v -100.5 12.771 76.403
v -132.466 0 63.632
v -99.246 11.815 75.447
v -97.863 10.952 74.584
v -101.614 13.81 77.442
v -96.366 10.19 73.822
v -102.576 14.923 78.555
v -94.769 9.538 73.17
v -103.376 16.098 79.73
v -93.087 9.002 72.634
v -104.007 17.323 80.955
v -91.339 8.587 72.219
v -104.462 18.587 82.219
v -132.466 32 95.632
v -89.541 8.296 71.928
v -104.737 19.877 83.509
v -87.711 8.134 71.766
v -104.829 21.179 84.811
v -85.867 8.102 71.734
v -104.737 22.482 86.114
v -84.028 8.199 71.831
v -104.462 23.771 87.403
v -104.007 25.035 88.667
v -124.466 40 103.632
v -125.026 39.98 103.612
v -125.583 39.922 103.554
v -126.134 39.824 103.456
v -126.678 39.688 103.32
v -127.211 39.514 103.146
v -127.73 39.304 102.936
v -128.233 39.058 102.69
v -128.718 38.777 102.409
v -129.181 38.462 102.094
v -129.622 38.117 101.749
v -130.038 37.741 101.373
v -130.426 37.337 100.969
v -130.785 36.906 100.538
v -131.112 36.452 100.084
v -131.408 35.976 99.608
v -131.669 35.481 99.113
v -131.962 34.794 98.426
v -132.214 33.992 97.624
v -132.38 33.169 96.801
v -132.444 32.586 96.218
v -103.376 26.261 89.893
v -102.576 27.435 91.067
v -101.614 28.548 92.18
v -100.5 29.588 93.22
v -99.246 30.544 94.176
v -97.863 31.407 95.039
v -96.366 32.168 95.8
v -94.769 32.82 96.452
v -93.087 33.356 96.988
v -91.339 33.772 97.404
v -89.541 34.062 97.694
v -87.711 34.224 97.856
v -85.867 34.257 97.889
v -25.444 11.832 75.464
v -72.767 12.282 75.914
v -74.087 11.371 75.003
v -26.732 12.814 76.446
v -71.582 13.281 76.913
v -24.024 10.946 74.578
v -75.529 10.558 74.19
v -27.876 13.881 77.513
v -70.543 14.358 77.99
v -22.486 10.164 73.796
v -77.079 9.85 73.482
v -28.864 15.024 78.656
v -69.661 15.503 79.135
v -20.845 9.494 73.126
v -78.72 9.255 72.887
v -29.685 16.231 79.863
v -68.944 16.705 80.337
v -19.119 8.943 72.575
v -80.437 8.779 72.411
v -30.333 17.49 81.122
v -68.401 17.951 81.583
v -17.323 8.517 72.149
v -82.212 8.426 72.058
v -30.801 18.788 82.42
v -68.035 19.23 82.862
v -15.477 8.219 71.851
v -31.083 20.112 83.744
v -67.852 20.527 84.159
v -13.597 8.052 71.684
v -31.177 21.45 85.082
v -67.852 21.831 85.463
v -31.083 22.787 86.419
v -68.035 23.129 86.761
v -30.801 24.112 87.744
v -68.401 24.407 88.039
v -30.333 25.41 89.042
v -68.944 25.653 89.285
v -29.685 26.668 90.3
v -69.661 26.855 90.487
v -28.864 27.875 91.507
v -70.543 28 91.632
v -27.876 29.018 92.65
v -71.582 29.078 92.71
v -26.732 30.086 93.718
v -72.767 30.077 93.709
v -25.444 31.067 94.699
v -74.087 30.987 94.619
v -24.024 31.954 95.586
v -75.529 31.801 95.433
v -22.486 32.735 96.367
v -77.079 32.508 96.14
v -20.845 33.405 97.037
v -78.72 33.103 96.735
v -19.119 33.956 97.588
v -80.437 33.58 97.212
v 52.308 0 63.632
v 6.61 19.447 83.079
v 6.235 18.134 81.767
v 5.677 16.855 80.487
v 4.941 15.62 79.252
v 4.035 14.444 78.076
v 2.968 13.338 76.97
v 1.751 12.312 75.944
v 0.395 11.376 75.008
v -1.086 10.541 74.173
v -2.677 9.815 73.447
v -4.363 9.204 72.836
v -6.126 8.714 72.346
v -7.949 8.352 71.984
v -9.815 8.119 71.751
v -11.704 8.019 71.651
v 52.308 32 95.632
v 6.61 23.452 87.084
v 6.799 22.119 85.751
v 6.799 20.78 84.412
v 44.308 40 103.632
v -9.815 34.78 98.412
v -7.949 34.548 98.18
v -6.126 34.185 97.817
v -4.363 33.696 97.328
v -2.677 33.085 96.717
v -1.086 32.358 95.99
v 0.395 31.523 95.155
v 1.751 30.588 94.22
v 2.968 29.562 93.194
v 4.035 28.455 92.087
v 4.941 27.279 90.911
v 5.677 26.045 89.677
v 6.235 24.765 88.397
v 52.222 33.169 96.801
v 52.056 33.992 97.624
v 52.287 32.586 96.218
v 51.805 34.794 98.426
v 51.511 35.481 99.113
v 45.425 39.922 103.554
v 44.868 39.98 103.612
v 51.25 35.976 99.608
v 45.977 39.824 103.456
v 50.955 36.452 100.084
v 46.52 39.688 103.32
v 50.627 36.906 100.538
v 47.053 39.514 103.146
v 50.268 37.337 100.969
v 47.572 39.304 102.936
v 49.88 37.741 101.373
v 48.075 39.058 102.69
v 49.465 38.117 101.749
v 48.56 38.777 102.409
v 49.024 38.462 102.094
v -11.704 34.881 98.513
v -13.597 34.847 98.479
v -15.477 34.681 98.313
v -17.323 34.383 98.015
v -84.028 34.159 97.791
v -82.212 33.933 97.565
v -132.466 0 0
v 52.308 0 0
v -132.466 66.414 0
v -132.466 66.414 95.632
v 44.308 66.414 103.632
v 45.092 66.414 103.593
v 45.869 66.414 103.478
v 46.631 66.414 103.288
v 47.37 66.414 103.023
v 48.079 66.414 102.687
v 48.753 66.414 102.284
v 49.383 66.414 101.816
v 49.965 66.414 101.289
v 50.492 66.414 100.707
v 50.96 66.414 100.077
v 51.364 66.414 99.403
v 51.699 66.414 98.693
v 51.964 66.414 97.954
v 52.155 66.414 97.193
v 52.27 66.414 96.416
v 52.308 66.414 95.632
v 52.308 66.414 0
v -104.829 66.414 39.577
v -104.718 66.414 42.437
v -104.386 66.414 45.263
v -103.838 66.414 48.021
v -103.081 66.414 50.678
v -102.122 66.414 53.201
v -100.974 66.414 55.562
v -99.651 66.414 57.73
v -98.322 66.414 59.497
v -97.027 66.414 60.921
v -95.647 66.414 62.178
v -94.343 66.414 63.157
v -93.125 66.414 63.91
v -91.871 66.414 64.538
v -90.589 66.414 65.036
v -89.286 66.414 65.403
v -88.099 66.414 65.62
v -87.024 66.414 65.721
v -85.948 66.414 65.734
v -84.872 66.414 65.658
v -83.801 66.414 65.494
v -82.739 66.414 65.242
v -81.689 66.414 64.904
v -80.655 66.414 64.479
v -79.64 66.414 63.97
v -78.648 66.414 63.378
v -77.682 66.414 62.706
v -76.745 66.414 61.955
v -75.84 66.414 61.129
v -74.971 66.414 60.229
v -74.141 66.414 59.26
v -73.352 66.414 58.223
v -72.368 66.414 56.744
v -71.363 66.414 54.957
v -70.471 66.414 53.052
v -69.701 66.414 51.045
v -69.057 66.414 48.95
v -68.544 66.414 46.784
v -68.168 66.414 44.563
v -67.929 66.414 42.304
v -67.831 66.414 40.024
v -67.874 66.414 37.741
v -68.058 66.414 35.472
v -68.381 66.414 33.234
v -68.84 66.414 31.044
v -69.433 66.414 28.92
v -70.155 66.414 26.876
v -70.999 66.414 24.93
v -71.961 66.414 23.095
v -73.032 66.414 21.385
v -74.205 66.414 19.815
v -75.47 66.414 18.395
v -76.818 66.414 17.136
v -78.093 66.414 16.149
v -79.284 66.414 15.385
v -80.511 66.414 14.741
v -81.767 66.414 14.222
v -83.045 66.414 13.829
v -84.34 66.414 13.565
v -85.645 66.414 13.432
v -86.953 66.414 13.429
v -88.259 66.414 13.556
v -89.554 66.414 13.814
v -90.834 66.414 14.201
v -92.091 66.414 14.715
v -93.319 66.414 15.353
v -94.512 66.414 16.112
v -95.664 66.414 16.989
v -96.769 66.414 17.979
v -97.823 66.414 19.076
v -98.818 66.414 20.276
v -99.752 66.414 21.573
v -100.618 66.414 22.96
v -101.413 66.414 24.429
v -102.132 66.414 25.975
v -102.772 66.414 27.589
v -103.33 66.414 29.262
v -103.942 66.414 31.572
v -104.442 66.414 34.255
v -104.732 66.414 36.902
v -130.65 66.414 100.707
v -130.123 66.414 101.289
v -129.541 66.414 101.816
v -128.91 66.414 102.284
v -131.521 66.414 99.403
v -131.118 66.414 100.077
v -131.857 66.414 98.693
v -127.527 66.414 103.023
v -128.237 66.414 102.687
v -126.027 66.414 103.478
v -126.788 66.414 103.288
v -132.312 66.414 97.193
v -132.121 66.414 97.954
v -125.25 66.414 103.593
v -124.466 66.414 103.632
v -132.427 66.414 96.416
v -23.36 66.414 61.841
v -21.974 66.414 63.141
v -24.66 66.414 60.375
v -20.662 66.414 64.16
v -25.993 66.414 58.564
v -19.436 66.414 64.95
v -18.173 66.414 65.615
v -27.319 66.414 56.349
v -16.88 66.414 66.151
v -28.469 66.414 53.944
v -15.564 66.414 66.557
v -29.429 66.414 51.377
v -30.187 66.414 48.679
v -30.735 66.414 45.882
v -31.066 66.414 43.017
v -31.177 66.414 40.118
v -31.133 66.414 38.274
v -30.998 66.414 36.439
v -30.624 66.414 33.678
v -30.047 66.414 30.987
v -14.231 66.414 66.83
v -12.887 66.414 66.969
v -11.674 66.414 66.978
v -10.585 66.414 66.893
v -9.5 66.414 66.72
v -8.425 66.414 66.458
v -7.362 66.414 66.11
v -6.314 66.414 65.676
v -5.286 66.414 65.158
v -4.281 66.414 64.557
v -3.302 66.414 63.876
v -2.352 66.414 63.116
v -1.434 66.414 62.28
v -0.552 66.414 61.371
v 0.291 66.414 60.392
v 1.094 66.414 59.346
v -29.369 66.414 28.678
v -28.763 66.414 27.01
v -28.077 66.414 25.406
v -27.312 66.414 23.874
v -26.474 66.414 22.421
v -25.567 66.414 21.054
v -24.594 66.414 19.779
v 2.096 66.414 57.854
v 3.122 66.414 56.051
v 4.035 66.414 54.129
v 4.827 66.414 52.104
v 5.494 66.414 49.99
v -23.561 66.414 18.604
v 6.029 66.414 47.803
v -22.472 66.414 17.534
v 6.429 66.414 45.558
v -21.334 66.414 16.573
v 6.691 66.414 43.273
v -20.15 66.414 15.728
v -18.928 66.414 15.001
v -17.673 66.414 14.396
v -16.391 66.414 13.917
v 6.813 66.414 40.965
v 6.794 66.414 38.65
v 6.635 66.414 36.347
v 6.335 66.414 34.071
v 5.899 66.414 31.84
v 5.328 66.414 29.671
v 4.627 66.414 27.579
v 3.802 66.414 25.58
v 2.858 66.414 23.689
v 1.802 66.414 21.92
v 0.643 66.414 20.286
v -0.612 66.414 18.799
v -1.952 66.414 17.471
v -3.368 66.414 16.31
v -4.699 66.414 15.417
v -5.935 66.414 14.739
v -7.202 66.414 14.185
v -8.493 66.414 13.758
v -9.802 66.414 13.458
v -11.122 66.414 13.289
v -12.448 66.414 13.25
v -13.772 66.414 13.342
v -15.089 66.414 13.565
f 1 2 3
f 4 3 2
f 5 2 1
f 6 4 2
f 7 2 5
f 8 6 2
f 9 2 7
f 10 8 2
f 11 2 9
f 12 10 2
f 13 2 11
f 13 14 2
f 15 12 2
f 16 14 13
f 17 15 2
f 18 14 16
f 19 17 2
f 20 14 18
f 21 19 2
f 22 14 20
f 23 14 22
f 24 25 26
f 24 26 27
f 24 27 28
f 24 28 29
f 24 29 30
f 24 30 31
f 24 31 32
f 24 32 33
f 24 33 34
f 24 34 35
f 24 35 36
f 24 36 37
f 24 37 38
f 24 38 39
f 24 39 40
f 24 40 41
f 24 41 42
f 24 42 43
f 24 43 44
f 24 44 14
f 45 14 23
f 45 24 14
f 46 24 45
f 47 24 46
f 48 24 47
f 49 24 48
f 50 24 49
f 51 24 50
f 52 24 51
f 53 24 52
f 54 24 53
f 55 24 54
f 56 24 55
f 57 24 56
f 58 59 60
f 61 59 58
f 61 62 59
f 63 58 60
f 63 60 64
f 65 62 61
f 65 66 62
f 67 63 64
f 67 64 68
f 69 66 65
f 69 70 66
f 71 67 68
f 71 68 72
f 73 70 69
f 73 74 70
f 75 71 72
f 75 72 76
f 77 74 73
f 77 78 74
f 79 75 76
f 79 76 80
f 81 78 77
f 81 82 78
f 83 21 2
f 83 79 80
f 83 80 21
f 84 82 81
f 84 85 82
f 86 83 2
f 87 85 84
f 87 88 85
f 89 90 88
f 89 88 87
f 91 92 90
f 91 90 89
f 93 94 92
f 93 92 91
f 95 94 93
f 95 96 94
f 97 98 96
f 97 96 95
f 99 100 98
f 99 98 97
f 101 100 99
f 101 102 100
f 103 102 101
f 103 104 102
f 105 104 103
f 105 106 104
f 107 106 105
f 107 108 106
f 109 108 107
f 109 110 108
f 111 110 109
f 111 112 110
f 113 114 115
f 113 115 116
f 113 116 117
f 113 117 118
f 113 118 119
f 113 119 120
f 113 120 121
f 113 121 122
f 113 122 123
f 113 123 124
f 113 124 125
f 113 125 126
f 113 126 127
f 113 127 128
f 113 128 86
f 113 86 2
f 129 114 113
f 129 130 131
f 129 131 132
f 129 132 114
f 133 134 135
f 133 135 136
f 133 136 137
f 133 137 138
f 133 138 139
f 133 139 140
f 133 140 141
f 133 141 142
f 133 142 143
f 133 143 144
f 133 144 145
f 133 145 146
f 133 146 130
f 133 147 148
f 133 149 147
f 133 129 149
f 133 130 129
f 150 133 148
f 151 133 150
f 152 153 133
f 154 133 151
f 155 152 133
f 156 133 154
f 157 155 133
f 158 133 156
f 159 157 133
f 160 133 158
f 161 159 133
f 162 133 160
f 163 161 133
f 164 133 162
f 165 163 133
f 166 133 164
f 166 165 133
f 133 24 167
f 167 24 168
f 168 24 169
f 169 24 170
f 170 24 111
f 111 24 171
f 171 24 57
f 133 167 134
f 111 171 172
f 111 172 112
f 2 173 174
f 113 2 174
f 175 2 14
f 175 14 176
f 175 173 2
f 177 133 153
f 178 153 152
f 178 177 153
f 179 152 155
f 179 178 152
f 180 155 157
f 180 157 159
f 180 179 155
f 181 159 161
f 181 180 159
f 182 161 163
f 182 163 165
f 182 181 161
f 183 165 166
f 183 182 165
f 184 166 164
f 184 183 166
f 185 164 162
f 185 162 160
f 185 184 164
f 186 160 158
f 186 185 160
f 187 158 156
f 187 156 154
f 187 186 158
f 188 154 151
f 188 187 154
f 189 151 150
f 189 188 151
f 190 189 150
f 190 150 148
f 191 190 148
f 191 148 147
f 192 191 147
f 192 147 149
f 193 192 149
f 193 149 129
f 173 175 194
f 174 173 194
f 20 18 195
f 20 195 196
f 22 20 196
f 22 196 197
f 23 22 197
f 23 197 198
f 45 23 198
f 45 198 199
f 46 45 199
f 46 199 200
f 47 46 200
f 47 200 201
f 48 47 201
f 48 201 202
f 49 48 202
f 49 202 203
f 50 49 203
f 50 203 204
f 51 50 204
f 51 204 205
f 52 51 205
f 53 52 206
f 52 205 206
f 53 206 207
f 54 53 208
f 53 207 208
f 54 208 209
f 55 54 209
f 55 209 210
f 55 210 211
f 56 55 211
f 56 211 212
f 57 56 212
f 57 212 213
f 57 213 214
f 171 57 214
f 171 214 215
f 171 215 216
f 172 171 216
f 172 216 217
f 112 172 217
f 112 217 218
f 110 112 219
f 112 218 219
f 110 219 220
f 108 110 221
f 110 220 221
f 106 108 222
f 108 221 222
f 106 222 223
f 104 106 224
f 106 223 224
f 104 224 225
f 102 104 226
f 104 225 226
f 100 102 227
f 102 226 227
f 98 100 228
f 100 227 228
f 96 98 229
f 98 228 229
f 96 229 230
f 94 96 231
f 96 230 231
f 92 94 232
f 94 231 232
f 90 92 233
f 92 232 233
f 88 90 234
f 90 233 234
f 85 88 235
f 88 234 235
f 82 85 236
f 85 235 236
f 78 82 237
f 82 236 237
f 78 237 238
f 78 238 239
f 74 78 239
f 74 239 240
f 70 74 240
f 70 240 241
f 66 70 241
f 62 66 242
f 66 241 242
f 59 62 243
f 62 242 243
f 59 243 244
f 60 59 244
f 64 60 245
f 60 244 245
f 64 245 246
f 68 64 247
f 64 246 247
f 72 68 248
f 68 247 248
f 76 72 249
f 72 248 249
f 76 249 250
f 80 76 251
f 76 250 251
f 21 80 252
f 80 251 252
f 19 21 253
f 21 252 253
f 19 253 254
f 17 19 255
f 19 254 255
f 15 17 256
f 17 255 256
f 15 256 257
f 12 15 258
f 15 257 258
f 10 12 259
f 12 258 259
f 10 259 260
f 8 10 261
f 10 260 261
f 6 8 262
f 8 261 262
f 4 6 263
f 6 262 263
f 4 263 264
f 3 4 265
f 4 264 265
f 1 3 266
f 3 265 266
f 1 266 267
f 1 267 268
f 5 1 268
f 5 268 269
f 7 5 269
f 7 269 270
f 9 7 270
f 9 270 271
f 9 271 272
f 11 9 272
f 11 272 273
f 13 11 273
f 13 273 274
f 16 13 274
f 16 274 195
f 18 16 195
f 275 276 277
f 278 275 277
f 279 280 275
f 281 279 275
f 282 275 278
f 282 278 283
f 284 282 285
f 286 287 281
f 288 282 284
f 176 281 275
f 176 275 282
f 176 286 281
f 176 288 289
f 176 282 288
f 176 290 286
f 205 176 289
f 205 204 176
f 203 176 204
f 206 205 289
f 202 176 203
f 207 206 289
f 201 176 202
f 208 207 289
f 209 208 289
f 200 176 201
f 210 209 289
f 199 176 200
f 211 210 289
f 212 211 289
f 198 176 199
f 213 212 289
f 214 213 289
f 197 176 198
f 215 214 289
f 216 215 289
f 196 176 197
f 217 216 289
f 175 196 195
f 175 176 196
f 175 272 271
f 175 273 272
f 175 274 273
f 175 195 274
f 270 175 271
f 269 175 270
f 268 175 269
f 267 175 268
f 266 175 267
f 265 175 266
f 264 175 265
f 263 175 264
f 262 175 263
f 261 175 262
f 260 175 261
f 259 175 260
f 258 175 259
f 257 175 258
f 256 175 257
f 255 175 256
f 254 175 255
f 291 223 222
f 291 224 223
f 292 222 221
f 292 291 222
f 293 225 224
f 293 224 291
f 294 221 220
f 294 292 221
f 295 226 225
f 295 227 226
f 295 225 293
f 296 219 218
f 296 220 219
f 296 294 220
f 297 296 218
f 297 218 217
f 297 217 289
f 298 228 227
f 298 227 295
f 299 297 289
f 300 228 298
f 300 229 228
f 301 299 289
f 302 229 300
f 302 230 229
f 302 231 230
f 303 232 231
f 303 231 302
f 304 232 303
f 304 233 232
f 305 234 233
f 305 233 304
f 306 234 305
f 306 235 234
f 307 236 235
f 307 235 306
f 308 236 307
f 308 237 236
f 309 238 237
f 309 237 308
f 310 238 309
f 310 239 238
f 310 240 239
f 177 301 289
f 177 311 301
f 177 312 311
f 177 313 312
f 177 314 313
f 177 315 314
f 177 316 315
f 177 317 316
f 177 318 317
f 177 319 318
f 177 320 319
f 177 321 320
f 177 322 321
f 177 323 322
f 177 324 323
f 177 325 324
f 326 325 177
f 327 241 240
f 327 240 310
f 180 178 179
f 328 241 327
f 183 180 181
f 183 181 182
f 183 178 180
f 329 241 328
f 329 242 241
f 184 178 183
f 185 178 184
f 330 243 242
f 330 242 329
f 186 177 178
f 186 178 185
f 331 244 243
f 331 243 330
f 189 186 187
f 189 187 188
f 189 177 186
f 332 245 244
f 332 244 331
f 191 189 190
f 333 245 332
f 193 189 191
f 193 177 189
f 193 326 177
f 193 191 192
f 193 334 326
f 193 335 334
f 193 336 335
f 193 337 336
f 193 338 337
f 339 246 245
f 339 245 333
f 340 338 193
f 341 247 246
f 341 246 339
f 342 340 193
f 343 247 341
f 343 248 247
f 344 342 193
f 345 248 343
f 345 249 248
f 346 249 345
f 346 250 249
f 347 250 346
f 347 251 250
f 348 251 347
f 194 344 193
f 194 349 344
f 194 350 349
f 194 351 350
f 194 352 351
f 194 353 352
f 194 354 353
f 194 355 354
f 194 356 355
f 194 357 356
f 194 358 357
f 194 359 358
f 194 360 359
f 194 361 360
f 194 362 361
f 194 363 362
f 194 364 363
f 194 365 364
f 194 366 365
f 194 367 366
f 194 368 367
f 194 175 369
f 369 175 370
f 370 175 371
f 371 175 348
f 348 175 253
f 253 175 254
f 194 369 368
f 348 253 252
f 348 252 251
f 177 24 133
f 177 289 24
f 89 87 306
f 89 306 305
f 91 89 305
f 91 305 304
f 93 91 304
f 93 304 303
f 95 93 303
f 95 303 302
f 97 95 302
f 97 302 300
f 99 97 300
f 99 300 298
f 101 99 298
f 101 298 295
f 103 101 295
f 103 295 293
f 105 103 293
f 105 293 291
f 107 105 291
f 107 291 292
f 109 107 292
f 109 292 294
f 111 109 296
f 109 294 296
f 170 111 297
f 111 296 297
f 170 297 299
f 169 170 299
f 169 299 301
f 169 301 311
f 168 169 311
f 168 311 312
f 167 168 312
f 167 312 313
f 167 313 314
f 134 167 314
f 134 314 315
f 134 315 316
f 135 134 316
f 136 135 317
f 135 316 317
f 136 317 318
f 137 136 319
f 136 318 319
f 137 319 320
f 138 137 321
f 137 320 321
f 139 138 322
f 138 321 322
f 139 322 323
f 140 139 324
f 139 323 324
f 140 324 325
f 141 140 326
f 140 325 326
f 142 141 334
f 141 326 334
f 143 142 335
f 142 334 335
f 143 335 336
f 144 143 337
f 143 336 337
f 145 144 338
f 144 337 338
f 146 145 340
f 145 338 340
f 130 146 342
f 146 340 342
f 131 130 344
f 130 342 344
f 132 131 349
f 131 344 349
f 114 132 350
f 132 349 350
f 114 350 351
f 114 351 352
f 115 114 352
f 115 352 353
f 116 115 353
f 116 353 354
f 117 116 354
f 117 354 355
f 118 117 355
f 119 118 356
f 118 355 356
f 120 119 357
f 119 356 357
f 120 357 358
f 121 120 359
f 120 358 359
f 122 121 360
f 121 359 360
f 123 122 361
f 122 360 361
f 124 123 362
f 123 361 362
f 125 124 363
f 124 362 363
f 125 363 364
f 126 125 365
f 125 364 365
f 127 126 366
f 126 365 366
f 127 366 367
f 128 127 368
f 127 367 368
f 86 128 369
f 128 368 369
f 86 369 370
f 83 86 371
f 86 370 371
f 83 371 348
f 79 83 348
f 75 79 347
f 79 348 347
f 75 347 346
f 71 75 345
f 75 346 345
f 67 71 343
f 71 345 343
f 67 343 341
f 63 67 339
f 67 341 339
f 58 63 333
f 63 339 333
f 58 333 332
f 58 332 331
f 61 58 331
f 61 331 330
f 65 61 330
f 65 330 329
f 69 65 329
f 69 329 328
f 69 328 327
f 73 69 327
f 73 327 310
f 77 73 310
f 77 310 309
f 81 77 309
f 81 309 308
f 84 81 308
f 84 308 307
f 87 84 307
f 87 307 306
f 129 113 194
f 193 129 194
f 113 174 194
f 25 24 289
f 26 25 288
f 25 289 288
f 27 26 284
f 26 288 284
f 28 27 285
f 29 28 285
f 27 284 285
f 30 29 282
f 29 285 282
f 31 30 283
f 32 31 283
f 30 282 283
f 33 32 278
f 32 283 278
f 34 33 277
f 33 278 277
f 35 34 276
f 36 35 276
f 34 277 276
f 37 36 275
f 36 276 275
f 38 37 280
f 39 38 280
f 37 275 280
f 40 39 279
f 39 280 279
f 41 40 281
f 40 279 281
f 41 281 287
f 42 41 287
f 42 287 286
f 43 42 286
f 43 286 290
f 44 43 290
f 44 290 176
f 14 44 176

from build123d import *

# Parameters (mm, degrees)
F0_W     = 184.774049
F0_H     = 66.413805
F1_DEPTH = 103.632
F2_SIZE  = 40
F5_D     = 37
F6_D     = 38
F7_R     = 8
F8_R     = 8


with BuildPart() as f1:
    # F0 (on Top) → F1 (new body)
    with BuildSketch(Plane.XY):
        with Locations((-40.078786, 33.206902)):
            Rectangle(F0_W, F0_H)
    extrude(amount=F1_DEPTH)

    # F2
    f2_edges = [f1.edges().sort_by_distance(p)[0] for p in [
        (-40.078785, 0, 103.632),
    ]]
    chamfer(f2_edges, length=F2_SIZE)

    # F5 (through all)
    with Locations(Plane(origin=(0, -31.816, 31.816), x_dir=(1, 0, 0), z_dir=(0, -0.707107, 0.707107))):
        with Locations((-86.328603, 74.946567)):
            Hole(F5_D / 2)

    # F6 (through all)
    with Locations(Plane(origin=(0, -31.816, 31.816), x_dir=(1, 0, 0), z_dir=(0, -0.707107, 0.707107))):
        with Locations((-12.177297, 75.329065)):
            Hole(F6_D / 2)

    # F7
    f7_edges = [f1.edges().sort_by_distance(p)[0] for p in [
        (52.308239, 53.206902, 103.632),
    ]]
    fillet(f7_edges, radius=F7_R)

    # F8
    f8_edges = [f1.edges().sort_by_distance(p)[0] for p in [
        (-132.46581, 53.206902, 103.632),
    ]]
    fillet(f8_edges, radius=F8_R)


solid = f1.part
